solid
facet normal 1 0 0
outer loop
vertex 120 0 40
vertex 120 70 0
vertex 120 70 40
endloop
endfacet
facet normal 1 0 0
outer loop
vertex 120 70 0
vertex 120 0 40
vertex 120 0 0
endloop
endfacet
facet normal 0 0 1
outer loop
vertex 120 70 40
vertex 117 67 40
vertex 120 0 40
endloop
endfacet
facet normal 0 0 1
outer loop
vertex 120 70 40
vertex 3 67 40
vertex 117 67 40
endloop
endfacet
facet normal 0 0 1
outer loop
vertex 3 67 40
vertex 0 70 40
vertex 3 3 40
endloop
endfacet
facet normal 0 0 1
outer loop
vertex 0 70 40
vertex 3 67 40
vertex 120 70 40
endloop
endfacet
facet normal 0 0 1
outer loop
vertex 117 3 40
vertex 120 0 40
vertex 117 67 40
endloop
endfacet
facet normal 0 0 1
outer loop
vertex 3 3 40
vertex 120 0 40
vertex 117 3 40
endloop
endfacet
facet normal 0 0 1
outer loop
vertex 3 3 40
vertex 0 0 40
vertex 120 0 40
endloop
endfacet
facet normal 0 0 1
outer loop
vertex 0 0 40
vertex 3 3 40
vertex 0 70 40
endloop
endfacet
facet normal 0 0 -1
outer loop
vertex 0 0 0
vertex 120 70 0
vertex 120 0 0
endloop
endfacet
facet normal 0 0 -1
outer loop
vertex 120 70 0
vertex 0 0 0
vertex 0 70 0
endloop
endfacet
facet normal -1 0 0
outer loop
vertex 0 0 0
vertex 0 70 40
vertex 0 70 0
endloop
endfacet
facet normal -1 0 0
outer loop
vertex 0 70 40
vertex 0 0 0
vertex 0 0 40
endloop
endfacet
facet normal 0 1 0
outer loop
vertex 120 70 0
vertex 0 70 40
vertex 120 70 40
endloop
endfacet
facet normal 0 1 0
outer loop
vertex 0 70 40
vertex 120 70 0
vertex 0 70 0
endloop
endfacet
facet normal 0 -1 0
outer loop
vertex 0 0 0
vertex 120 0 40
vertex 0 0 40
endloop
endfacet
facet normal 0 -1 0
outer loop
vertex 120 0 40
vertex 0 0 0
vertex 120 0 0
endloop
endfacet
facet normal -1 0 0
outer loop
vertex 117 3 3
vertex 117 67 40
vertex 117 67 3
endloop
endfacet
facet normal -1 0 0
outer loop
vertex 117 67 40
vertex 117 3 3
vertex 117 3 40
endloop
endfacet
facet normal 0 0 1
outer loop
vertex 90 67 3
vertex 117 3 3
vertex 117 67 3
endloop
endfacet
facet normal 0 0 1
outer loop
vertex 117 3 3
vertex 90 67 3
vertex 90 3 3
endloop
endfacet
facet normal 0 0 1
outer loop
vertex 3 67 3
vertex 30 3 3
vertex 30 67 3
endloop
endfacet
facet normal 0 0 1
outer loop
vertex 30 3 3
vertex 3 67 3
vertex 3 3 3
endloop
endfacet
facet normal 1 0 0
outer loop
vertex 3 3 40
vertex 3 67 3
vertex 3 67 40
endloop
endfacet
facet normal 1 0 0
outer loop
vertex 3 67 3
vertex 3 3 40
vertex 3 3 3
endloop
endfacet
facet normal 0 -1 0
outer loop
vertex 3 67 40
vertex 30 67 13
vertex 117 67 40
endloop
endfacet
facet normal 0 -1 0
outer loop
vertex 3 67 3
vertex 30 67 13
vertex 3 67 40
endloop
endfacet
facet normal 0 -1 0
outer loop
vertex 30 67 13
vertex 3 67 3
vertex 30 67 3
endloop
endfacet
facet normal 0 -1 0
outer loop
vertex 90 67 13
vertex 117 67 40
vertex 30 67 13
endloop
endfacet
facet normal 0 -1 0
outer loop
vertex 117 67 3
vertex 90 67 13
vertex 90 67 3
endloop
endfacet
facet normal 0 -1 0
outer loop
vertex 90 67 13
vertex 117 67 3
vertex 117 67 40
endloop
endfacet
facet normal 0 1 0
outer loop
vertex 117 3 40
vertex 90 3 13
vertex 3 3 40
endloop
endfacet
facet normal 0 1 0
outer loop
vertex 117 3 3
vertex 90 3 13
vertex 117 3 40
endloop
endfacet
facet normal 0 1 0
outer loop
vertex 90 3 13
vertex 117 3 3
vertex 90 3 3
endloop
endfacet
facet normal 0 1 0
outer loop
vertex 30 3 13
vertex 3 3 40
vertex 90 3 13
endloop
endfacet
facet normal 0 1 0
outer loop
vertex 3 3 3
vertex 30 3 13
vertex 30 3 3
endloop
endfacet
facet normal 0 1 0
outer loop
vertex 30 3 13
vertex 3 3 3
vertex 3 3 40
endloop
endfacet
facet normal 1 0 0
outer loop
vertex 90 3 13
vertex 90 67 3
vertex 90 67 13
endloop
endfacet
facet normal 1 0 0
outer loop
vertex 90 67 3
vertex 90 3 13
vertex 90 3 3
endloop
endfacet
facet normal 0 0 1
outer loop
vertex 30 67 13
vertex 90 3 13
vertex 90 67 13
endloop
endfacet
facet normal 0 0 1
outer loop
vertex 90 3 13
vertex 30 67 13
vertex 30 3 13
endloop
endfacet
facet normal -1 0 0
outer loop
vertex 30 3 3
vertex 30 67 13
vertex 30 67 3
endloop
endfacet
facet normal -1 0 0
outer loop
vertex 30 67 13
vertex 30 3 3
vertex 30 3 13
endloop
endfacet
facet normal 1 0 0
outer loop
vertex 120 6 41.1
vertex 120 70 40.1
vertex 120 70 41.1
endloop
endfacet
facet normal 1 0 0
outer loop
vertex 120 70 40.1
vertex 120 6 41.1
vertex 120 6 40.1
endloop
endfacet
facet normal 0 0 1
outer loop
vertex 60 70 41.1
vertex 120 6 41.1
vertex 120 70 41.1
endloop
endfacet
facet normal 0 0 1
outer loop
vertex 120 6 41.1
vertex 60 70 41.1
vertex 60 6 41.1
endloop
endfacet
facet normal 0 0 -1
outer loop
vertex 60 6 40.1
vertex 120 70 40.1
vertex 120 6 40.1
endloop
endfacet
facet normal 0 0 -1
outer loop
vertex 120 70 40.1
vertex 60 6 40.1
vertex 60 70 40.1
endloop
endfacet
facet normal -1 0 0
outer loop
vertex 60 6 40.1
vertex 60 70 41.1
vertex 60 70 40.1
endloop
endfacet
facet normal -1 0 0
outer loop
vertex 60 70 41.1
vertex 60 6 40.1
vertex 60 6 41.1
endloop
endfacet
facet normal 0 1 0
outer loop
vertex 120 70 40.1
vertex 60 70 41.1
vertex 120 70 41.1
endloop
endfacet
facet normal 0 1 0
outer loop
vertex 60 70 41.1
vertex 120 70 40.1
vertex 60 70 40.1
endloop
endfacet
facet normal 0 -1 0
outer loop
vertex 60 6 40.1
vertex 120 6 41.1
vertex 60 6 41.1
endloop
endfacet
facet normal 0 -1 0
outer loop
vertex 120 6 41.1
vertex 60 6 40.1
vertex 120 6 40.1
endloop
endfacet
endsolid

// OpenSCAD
// Buffer Tank for Mini Horizontal Gel Electrophoresis
// Units: millimetres

// Outer Dimensions
$outer_x = 120;
$outer_y = 70;
$outer_z = 40;

// Wall and Floor Thickness
$wall_thick = 3;
$floor_thick = 3;

// Platform Dimensions
$platform_x = 60;
$platform_y = $outer_y; // Spans full outer width to ensure structural integrity and alignment
$platform_height = 10;  // Height above inner floor
$platform_z_top = $outer_z - $wall_thick - $floor_thick + $platform_height; // 40 - 3 - 3 + 10 = 44

// Hole Dimensions
$hole_diameter = 2;
$hole_y = 0;
$hole_z = 30;

// Configuration
$fn = 128; // High resolution for smooth curves and accurate hole sizing

// Derived Dimensions
$inner_x = $outer_x - 2*$wall_thick; // 114
$inner_y = $outer_y - 2*$wall_thick; // 64
$inner_z = $outer_z - $floor_thick;  // 37 (Top of inner floor)

// Main Tank Body
// Constructed as a hollow box with a floor
difference() {
    // Outer Block
    cube([
        $outer_x, 
        $outer_y, 
        $outer_z
    ], center = false);

    // Inner Void (Hollow part)
    // The void starts at the top of the floor and goes up to the top of the tank
    translate([
        $wall_thick, 
        $wall_thick, 
        $floor_thick
    ]) {
        cube([
            $inner_x, 
            $inner_y, 
            $outer_z - $floor_thick
        ], center = false);
    }
    
    // Extend the inner void slightly past the top to ensure clean cut
    translate([
        $wall_thick, 
        $wall_thick, 
        $outer_z + 0.1
    ]) {
        cube([
            $inner_x, 
            $inner_y, 
            1
        ], center = false);
    }
}

// Raised Platform
// Located in the middle of the tank, spanning full width
// It sits on the inner floor (Z=3) and rises 10mm (Top at Z=13)
translate([
    ($outer_x - $platform_x) / 2, 
    $wall_thick, // Positioned at the inner wall Y coordinate
    $floor_thick
]) {
    // Platform Base
    cube([
        $platform_x,
        $inner_y,
        $platform_height
    ], center = false);
    
    // Extend slightly above to ensure it connects seamlessly with the top wall
    translate([
        ($outer_x - $platform_x) / 2,
        $wall_thick,
        $outer_z - $wall_thick + 0.1
    ]) {
        cube([
            $platform_x,
            $inner_y,
            1
        ], center = false);
    }
}

// Electrode Holes
// Two holes, one at each X end, through the end walls
// Position: y = 0, z = 30
// Direction: Along X axis

difference() {
    // Re-create the base tank and platform logic here to ensure the holes cut through everything
    // 1. Tank Body
    difference() {
        cube([
            $outer_x, 
            $outer_y, 
            $outer_z
        ], center = false);
        
        translate([
            $wall_thick, 
            $wall_thick, 
            $floor_thick
        ]) {
            cube([
                $inner_x, 
                $inner_y, 
                $outer_z - $floor_thick
            ], center = false);
            
            // Extend void past top
            translate([
                $wall_thick, 
                $wall_thick, 
                $outer_z + 0.1
            ]) {
                cube([
                    $inner_x, 
                    $inner_y, 
                    1
                ], center = false);
            }
        }
    }
    
    // 2. Platform
    translate([
        ($outer_x - $platform_x) / 2, 
        $wall_thick, 
        $floor_thick
    ]) {
        cube([
            $platform_x,
            $inner_y,
            $platform_height
        ], center = false);
        
        // Extend above
        translate([
            ($outer_x - $platform_x) / 2,
            $wall_thick,
            $outer_z - $wall_thick + 0.1
        ]) {
            cube([
                $platform_x,
                $inner_y,
                1
            ], center = false);
        }
    }
    
    // 3. Cut Holes
    // Left Hole
    translate([
        -$outer_x/2 + $hole_diameter/2, // Centered on left face
        $hole_y,
        $hole_z
    ]) {
        cylinder(
            h = $outer_x + 1, // Extend past both ends
            r = $hole_diameter/2,
            $fn = $fn
        );
    }
    
    // Right Hole
    translate([
        $outer_x/2 - $hole_diameter/2, // Centered on right face
        $hole_y,
        $hole_z
    ]) {
        cylinder(
            h = $outer_x + 1, // Extend past both ends
            r = $hole_diameter/2,
            $fn = $fn
        );
    }
}
